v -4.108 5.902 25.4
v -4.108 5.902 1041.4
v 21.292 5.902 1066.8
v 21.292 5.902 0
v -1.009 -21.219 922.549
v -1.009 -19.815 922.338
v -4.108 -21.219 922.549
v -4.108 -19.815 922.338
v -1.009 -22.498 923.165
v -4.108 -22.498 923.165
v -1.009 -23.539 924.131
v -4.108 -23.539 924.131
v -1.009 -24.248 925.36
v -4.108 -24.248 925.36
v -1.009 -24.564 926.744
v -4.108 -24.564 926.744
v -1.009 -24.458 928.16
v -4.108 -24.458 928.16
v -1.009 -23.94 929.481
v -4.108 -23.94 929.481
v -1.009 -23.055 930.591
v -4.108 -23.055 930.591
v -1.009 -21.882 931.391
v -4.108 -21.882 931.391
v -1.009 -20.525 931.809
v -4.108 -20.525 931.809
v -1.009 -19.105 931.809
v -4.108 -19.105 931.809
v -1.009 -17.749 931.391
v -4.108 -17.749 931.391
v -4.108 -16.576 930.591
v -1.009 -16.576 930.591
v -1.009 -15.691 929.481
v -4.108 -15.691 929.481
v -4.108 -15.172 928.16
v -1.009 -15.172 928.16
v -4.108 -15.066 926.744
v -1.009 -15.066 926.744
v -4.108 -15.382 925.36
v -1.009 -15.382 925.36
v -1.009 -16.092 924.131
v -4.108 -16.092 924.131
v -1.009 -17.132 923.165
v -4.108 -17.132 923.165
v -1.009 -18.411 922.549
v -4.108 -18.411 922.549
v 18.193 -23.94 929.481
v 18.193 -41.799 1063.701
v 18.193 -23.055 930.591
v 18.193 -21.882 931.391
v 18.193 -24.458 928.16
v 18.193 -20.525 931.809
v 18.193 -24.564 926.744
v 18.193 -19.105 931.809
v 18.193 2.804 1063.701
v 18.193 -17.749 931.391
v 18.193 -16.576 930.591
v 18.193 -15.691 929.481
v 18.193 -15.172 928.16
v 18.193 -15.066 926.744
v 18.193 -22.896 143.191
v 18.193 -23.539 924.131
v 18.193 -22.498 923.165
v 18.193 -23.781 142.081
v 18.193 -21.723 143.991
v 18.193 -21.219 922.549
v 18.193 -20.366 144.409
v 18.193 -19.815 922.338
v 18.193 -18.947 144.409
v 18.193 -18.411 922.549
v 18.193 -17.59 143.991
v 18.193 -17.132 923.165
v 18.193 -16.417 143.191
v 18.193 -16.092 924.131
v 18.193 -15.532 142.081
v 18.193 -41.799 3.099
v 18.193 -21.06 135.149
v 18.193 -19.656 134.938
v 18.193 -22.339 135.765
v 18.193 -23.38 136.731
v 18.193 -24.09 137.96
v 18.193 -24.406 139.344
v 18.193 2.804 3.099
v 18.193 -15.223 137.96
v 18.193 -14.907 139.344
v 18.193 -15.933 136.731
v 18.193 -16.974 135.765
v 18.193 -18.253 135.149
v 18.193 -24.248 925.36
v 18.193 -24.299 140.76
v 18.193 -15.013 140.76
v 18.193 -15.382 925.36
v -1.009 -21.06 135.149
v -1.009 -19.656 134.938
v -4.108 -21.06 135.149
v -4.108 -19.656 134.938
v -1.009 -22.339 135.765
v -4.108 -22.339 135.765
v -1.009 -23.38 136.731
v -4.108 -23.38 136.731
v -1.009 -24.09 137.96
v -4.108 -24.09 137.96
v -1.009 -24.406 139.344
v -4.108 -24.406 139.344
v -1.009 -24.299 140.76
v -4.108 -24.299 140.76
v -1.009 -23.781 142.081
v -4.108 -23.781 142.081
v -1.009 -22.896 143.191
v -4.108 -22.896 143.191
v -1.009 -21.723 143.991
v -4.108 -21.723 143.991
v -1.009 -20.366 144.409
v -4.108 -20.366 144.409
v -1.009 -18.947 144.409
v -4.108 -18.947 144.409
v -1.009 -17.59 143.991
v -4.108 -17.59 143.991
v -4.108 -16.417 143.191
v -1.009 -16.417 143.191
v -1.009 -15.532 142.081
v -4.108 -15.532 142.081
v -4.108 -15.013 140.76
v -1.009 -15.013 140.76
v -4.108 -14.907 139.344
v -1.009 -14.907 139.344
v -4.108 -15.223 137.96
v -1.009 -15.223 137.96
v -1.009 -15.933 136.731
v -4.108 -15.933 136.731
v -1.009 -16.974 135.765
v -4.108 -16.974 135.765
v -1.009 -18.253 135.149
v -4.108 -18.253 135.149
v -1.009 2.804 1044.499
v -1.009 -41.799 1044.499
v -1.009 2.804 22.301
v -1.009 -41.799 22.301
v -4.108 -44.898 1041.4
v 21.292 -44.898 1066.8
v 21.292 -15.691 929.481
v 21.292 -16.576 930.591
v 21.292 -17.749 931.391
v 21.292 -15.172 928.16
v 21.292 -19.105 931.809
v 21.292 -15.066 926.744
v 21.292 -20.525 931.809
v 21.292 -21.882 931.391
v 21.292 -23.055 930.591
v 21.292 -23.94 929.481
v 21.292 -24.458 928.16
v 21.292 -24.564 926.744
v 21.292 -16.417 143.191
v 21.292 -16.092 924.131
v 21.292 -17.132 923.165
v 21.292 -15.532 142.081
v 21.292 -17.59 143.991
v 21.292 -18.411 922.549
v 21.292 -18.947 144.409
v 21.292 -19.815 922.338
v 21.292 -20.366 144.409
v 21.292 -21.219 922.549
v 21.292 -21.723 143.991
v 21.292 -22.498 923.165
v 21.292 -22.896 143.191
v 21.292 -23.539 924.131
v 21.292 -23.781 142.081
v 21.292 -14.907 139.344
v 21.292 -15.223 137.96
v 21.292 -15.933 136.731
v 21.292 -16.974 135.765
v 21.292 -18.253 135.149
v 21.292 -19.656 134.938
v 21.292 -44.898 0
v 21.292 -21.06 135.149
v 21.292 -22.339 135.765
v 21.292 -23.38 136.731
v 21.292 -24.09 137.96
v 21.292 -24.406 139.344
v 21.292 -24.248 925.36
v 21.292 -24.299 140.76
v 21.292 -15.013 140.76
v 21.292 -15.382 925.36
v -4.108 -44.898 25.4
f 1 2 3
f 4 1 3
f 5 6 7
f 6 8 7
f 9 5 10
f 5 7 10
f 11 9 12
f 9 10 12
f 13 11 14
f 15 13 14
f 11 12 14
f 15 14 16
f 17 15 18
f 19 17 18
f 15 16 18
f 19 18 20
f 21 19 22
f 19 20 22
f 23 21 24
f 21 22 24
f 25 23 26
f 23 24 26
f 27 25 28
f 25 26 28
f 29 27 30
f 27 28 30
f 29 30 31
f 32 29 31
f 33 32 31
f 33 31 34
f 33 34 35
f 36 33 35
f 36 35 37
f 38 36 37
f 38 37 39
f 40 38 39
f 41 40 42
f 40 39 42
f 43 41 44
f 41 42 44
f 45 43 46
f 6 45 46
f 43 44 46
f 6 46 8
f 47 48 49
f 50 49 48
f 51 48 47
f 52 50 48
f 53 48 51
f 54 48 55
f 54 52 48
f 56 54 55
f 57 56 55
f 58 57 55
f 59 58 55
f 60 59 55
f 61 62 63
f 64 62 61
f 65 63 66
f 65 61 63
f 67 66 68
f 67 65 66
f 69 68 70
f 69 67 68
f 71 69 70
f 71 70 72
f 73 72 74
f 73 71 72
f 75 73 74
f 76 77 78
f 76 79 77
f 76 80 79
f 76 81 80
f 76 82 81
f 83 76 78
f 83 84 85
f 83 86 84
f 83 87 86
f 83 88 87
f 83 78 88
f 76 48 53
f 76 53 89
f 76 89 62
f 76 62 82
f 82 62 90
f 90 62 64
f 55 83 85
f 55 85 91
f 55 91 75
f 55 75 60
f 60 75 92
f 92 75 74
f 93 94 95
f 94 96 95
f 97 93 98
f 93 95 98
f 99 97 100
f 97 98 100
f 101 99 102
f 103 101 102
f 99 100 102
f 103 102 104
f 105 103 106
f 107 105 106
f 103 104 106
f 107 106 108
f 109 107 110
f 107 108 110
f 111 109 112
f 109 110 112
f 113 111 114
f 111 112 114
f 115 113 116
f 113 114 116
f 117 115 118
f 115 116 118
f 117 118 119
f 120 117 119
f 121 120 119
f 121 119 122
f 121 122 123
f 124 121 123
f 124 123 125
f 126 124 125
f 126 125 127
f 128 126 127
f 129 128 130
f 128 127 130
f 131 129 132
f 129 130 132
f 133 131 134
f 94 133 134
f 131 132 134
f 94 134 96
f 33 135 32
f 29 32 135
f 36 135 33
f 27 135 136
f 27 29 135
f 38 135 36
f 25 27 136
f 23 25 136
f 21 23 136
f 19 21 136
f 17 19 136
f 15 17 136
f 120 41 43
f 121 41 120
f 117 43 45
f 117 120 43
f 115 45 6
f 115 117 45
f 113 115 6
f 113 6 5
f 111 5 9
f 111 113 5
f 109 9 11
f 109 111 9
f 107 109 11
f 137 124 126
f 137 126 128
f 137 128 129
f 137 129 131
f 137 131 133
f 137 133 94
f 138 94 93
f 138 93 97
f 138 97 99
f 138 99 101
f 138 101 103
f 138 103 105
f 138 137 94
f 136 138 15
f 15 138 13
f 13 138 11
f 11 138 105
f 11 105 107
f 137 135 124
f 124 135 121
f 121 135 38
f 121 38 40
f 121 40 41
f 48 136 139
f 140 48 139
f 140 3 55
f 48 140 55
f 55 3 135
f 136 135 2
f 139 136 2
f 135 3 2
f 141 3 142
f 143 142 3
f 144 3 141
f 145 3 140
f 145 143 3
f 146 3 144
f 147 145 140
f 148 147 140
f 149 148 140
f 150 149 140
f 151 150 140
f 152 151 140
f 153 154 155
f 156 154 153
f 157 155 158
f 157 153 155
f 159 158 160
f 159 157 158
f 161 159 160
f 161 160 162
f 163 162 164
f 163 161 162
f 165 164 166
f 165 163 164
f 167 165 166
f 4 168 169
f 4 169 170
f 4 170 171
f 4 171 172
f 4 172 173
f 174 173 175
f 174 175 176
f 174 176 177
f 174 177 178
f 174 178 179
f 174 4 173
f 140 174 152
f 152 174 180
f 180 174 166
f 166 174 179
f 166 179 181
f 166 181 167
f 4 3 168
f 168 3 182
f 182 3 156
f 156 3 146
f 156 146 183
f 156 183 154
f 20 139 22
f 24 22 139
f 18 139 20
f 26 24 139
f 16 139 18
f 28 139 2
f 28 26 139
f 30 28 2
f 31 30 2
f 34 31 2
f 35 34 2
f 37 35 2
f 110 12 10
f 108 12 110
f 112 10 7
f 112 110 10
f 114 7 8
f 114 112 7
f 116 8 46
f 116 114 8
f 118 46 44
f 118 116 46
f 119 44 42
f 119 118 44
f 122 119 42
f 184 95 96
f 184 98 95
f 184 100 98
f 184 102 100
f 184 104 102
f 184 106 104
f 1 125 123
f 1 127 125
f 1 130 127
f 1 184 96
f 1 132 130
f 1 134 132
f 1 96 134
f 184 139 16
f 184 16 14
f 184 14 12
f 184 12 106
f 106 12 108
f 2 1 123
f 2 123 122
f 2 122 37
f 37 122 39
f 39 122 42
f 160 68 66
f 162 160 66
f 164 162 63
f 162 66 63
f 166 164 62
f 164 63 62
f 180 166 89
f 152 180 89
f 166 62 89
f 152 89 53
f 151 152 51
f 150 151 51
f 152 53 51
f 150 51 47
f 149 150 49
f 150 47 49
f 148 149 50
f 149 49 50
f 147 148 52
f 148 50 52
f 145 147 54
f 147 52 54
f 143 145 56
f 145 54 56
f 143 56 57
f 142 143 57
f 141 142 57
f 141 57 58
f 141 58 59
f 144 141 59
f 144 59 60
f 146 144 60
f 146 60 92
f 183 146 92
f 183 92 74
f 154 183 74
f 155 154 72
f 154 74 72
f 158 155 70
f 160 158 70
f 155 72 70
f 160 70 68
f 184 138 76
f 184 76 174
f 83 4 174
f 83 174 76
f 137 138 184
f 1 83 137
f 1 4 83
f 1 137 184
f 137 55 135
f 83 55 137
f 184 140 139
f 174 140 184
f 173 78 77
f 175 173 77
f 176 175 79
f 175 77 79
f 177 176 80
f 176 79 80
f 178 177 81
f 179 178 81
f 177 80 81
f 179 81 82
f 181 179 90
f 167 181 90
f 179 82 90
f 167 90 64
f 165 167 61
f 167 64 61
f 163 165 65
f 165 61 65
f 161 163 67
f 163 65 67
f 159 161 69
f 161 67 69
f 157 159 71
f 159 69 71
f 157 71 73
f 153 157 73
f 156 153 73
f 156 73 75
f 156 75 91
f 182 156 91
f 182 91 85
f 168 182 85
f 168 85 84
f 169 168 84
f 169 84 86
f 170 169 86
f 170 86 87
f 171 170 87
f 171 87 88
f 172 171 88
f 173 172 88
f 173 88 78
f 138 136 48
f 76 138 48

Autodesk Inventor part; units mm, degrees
ref_plane "YZ Plane" through (0, 0, 0) normal (1, 0, 0) x (0, 1, 0)
ref_plane "XZ Plane" through (0, 0, 0) normal (0, 1, 0) x (-1, 0, 0)
ref_plane "XY Plane" through (0, 0, 0) normal (0, 0, 1) x (1, 0, 0)
sketch "Sketch2" plane through (0, 0, 0) normal (0, 0, 1) x (1, 0, 0)
  line L0 (-4.1078, 5.9023) -> (21.2922, 5.9023)
  line L1 (21.2922, 5.9023) -> (21.2922, -44.8977)
  line L2 (21.2922, -44.8977) -> (-4.1078, -44.8977)
  line L3 (-4.1078, -44.8977) -> (-4.1078, 5.9023)
  line L4 (18.1934, 2.8035) -> (-1.009, 2.8035)
  line L5 (-1.009, 2.8035) -> (-1.009, -41.7989)
  line L6 (-1.009, -41.7989) -> (18.1934, -41.7989)
  line L7 (18.1934, -41.7989) -> (18.1934, 2.8035)
  point P0 (0, 0)
  dimension "d0" = 25.4
  dimension "d1" = 50.8
  dimension "d2" = 3.0988
extrude "Extrusion1" add sketch "Sketch2" along normal blind 1066.8
sketch "Sketch5" plane through (0, 0, 1066.8) normal (0, 0, 1) x (1, 0, 0)
  point P0 (0, 0)
sketch "Sketch6" plane through (-4.1078, 5.9023, 0) normal (0, 1, 0) x (1, 0, 0)
  line L0 (25.4, 0) -> (-1.2066, -26.6066)
  line L1 (0, 0) -> (0, -1066.8) projected
  line L2 (0, -25.4) -> (0, 0)
  line L3 (0, 0) -> (25.4, 0)
  line L4 (0, -1066.8) -> (25.4, -1066.8) projected
  line L5 (25.4, -1066.8) -> (-7.0638, -1034.3362)
  line L6 (25.4, -1066.8) -> (71.3108, -1066.8) construction
  line L7 (0, -1041.4) -> (0, -1066.8)
  line L8 (0, -1066.8) -> (25.4, -1066.8)
  point P0 (4.1078, 0)
  dimension "d11" = 135
extrude "Extrusion2" cut sketch "Sketch6" against normal blind 1066.8 contours L0 L1 L3
extrude "Extrusion3" cut sketch "Sketch6" against normal blind 1066.8 contours L5 L4 L1
sketch "Sketch7" plane through (21.2922, -44.8977, 0) normal (1, 0, 0) x (0, 0, -1)
  line L0 (0, 0) -> (-1066.8, 0) projected
  line L1 (0, 50.4825) -> (-139.7, 50.4825)
  line L2 (-139.7, 50.4825) -> (-139.7, 0)
  line L3 (-139.7, 0) -> (0, 0)
  line L4 (0, 0) -> (0, 50.4825)
  line L5 (-1066.8, 50.4825) -> (-927.1, 50.4825)
  line L6 (-927.1, 50.4825) -> (-927.1, -0.3175)
  line L7 (-927.1, -0.3175) -> (-1066.8, -0.3175)
  line L8 (-1066.8, -0.3175) -> (-1066.8, 50.4825)
  point P0 (0, 44.8977)
  point P1 (-139.7, 25.2412)
  point P2 (-927.1, 25.0825)
  dimension "d12" = 139.7
  dimension "d13" = 139.7
  dimension "d14" = 50.8
hole "Hole1" at (21.2922, -19.8152, 927.1) at (21.2922, -19.6564, 139.7) direction (-1, 0, 0) diameter 9.525 end through all
properties part number "42in 2x1 boxbeam"
